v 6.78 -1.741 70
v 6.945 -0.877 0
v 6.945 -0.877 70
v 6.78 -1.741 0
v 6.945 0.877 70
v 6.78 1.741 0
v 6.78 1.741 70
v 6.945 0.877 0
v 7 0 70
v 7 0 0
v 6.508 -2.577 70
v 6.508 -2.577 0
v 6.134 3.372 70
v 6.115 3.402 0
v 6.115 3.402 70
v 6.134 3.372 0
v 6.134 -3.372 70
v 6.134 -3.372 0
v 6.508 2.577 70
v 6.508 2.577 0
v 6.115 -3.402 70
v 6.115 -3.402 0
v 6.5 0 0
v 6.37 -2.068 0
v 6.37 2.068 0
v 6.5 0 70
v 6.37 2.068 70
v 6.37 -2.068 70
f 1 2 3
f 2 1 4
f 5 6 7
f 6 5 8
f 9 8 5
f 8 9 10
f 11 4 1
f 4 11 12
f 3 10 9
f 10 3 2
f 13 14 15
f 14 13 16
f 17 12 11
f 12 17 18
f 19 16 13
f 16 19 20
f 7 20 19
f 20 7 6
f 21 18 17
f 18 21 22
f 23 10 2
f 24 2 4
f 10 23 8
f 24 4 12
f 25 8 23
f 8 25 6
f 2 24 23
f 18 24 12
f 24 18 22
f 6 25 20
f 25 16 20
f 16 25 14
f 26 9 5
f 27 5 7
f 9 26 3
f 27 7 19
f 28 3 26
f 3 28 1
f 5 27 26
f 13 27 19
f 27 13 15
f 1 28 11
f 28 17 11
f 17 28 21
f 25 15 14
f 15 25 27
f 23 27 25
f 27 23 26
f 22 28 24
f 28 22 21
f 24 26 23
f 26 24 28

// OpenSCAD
$fn = 50;


difference() {
	union() {
		cylinder(h = 70, r = 7.0000000000);
		translate(v = [-13.0000000000, 0, 0]) {
			cylinder(h = 70, r = 7.0000000000);
		}
	}
	union() {
		cylinder(h = 70, r = 3.2500000000);
		cylinder(h = 70, r = 1.8000000000);
		cylinder(h = 70, r = 1.8000000000);
		cylinder(h = 70, r = 1.8000000000);
		translate(v = [-17.5000000000, 0, 0]) {
			hull() {
				translate(v = [-3.7500000000, 0.0000000000, 0]) {
					cylinder(h = 70, r = 7.5000000000);
				}
				translate(v = [3.7500000000, 0.0000000000, 0]) {
					cylinder(h = 70, r = 7.5000000000);
				}
				translate(v = [-3.7500000000, -0.0000000000, 0]) {
					cylinder(h = 70, r = 7.5000000000);
				}
				translate(v = [3.7500000000, -0.0000000000, 0]) {
					cylinder(h = 70, r = 7.5000000000);
				}
			}
		}
		translate(v = [-10.0000000000, 0, 0.0000000000]) {
			cylinder(h = 70, r = 16.5000000000);
		}
	}
}
